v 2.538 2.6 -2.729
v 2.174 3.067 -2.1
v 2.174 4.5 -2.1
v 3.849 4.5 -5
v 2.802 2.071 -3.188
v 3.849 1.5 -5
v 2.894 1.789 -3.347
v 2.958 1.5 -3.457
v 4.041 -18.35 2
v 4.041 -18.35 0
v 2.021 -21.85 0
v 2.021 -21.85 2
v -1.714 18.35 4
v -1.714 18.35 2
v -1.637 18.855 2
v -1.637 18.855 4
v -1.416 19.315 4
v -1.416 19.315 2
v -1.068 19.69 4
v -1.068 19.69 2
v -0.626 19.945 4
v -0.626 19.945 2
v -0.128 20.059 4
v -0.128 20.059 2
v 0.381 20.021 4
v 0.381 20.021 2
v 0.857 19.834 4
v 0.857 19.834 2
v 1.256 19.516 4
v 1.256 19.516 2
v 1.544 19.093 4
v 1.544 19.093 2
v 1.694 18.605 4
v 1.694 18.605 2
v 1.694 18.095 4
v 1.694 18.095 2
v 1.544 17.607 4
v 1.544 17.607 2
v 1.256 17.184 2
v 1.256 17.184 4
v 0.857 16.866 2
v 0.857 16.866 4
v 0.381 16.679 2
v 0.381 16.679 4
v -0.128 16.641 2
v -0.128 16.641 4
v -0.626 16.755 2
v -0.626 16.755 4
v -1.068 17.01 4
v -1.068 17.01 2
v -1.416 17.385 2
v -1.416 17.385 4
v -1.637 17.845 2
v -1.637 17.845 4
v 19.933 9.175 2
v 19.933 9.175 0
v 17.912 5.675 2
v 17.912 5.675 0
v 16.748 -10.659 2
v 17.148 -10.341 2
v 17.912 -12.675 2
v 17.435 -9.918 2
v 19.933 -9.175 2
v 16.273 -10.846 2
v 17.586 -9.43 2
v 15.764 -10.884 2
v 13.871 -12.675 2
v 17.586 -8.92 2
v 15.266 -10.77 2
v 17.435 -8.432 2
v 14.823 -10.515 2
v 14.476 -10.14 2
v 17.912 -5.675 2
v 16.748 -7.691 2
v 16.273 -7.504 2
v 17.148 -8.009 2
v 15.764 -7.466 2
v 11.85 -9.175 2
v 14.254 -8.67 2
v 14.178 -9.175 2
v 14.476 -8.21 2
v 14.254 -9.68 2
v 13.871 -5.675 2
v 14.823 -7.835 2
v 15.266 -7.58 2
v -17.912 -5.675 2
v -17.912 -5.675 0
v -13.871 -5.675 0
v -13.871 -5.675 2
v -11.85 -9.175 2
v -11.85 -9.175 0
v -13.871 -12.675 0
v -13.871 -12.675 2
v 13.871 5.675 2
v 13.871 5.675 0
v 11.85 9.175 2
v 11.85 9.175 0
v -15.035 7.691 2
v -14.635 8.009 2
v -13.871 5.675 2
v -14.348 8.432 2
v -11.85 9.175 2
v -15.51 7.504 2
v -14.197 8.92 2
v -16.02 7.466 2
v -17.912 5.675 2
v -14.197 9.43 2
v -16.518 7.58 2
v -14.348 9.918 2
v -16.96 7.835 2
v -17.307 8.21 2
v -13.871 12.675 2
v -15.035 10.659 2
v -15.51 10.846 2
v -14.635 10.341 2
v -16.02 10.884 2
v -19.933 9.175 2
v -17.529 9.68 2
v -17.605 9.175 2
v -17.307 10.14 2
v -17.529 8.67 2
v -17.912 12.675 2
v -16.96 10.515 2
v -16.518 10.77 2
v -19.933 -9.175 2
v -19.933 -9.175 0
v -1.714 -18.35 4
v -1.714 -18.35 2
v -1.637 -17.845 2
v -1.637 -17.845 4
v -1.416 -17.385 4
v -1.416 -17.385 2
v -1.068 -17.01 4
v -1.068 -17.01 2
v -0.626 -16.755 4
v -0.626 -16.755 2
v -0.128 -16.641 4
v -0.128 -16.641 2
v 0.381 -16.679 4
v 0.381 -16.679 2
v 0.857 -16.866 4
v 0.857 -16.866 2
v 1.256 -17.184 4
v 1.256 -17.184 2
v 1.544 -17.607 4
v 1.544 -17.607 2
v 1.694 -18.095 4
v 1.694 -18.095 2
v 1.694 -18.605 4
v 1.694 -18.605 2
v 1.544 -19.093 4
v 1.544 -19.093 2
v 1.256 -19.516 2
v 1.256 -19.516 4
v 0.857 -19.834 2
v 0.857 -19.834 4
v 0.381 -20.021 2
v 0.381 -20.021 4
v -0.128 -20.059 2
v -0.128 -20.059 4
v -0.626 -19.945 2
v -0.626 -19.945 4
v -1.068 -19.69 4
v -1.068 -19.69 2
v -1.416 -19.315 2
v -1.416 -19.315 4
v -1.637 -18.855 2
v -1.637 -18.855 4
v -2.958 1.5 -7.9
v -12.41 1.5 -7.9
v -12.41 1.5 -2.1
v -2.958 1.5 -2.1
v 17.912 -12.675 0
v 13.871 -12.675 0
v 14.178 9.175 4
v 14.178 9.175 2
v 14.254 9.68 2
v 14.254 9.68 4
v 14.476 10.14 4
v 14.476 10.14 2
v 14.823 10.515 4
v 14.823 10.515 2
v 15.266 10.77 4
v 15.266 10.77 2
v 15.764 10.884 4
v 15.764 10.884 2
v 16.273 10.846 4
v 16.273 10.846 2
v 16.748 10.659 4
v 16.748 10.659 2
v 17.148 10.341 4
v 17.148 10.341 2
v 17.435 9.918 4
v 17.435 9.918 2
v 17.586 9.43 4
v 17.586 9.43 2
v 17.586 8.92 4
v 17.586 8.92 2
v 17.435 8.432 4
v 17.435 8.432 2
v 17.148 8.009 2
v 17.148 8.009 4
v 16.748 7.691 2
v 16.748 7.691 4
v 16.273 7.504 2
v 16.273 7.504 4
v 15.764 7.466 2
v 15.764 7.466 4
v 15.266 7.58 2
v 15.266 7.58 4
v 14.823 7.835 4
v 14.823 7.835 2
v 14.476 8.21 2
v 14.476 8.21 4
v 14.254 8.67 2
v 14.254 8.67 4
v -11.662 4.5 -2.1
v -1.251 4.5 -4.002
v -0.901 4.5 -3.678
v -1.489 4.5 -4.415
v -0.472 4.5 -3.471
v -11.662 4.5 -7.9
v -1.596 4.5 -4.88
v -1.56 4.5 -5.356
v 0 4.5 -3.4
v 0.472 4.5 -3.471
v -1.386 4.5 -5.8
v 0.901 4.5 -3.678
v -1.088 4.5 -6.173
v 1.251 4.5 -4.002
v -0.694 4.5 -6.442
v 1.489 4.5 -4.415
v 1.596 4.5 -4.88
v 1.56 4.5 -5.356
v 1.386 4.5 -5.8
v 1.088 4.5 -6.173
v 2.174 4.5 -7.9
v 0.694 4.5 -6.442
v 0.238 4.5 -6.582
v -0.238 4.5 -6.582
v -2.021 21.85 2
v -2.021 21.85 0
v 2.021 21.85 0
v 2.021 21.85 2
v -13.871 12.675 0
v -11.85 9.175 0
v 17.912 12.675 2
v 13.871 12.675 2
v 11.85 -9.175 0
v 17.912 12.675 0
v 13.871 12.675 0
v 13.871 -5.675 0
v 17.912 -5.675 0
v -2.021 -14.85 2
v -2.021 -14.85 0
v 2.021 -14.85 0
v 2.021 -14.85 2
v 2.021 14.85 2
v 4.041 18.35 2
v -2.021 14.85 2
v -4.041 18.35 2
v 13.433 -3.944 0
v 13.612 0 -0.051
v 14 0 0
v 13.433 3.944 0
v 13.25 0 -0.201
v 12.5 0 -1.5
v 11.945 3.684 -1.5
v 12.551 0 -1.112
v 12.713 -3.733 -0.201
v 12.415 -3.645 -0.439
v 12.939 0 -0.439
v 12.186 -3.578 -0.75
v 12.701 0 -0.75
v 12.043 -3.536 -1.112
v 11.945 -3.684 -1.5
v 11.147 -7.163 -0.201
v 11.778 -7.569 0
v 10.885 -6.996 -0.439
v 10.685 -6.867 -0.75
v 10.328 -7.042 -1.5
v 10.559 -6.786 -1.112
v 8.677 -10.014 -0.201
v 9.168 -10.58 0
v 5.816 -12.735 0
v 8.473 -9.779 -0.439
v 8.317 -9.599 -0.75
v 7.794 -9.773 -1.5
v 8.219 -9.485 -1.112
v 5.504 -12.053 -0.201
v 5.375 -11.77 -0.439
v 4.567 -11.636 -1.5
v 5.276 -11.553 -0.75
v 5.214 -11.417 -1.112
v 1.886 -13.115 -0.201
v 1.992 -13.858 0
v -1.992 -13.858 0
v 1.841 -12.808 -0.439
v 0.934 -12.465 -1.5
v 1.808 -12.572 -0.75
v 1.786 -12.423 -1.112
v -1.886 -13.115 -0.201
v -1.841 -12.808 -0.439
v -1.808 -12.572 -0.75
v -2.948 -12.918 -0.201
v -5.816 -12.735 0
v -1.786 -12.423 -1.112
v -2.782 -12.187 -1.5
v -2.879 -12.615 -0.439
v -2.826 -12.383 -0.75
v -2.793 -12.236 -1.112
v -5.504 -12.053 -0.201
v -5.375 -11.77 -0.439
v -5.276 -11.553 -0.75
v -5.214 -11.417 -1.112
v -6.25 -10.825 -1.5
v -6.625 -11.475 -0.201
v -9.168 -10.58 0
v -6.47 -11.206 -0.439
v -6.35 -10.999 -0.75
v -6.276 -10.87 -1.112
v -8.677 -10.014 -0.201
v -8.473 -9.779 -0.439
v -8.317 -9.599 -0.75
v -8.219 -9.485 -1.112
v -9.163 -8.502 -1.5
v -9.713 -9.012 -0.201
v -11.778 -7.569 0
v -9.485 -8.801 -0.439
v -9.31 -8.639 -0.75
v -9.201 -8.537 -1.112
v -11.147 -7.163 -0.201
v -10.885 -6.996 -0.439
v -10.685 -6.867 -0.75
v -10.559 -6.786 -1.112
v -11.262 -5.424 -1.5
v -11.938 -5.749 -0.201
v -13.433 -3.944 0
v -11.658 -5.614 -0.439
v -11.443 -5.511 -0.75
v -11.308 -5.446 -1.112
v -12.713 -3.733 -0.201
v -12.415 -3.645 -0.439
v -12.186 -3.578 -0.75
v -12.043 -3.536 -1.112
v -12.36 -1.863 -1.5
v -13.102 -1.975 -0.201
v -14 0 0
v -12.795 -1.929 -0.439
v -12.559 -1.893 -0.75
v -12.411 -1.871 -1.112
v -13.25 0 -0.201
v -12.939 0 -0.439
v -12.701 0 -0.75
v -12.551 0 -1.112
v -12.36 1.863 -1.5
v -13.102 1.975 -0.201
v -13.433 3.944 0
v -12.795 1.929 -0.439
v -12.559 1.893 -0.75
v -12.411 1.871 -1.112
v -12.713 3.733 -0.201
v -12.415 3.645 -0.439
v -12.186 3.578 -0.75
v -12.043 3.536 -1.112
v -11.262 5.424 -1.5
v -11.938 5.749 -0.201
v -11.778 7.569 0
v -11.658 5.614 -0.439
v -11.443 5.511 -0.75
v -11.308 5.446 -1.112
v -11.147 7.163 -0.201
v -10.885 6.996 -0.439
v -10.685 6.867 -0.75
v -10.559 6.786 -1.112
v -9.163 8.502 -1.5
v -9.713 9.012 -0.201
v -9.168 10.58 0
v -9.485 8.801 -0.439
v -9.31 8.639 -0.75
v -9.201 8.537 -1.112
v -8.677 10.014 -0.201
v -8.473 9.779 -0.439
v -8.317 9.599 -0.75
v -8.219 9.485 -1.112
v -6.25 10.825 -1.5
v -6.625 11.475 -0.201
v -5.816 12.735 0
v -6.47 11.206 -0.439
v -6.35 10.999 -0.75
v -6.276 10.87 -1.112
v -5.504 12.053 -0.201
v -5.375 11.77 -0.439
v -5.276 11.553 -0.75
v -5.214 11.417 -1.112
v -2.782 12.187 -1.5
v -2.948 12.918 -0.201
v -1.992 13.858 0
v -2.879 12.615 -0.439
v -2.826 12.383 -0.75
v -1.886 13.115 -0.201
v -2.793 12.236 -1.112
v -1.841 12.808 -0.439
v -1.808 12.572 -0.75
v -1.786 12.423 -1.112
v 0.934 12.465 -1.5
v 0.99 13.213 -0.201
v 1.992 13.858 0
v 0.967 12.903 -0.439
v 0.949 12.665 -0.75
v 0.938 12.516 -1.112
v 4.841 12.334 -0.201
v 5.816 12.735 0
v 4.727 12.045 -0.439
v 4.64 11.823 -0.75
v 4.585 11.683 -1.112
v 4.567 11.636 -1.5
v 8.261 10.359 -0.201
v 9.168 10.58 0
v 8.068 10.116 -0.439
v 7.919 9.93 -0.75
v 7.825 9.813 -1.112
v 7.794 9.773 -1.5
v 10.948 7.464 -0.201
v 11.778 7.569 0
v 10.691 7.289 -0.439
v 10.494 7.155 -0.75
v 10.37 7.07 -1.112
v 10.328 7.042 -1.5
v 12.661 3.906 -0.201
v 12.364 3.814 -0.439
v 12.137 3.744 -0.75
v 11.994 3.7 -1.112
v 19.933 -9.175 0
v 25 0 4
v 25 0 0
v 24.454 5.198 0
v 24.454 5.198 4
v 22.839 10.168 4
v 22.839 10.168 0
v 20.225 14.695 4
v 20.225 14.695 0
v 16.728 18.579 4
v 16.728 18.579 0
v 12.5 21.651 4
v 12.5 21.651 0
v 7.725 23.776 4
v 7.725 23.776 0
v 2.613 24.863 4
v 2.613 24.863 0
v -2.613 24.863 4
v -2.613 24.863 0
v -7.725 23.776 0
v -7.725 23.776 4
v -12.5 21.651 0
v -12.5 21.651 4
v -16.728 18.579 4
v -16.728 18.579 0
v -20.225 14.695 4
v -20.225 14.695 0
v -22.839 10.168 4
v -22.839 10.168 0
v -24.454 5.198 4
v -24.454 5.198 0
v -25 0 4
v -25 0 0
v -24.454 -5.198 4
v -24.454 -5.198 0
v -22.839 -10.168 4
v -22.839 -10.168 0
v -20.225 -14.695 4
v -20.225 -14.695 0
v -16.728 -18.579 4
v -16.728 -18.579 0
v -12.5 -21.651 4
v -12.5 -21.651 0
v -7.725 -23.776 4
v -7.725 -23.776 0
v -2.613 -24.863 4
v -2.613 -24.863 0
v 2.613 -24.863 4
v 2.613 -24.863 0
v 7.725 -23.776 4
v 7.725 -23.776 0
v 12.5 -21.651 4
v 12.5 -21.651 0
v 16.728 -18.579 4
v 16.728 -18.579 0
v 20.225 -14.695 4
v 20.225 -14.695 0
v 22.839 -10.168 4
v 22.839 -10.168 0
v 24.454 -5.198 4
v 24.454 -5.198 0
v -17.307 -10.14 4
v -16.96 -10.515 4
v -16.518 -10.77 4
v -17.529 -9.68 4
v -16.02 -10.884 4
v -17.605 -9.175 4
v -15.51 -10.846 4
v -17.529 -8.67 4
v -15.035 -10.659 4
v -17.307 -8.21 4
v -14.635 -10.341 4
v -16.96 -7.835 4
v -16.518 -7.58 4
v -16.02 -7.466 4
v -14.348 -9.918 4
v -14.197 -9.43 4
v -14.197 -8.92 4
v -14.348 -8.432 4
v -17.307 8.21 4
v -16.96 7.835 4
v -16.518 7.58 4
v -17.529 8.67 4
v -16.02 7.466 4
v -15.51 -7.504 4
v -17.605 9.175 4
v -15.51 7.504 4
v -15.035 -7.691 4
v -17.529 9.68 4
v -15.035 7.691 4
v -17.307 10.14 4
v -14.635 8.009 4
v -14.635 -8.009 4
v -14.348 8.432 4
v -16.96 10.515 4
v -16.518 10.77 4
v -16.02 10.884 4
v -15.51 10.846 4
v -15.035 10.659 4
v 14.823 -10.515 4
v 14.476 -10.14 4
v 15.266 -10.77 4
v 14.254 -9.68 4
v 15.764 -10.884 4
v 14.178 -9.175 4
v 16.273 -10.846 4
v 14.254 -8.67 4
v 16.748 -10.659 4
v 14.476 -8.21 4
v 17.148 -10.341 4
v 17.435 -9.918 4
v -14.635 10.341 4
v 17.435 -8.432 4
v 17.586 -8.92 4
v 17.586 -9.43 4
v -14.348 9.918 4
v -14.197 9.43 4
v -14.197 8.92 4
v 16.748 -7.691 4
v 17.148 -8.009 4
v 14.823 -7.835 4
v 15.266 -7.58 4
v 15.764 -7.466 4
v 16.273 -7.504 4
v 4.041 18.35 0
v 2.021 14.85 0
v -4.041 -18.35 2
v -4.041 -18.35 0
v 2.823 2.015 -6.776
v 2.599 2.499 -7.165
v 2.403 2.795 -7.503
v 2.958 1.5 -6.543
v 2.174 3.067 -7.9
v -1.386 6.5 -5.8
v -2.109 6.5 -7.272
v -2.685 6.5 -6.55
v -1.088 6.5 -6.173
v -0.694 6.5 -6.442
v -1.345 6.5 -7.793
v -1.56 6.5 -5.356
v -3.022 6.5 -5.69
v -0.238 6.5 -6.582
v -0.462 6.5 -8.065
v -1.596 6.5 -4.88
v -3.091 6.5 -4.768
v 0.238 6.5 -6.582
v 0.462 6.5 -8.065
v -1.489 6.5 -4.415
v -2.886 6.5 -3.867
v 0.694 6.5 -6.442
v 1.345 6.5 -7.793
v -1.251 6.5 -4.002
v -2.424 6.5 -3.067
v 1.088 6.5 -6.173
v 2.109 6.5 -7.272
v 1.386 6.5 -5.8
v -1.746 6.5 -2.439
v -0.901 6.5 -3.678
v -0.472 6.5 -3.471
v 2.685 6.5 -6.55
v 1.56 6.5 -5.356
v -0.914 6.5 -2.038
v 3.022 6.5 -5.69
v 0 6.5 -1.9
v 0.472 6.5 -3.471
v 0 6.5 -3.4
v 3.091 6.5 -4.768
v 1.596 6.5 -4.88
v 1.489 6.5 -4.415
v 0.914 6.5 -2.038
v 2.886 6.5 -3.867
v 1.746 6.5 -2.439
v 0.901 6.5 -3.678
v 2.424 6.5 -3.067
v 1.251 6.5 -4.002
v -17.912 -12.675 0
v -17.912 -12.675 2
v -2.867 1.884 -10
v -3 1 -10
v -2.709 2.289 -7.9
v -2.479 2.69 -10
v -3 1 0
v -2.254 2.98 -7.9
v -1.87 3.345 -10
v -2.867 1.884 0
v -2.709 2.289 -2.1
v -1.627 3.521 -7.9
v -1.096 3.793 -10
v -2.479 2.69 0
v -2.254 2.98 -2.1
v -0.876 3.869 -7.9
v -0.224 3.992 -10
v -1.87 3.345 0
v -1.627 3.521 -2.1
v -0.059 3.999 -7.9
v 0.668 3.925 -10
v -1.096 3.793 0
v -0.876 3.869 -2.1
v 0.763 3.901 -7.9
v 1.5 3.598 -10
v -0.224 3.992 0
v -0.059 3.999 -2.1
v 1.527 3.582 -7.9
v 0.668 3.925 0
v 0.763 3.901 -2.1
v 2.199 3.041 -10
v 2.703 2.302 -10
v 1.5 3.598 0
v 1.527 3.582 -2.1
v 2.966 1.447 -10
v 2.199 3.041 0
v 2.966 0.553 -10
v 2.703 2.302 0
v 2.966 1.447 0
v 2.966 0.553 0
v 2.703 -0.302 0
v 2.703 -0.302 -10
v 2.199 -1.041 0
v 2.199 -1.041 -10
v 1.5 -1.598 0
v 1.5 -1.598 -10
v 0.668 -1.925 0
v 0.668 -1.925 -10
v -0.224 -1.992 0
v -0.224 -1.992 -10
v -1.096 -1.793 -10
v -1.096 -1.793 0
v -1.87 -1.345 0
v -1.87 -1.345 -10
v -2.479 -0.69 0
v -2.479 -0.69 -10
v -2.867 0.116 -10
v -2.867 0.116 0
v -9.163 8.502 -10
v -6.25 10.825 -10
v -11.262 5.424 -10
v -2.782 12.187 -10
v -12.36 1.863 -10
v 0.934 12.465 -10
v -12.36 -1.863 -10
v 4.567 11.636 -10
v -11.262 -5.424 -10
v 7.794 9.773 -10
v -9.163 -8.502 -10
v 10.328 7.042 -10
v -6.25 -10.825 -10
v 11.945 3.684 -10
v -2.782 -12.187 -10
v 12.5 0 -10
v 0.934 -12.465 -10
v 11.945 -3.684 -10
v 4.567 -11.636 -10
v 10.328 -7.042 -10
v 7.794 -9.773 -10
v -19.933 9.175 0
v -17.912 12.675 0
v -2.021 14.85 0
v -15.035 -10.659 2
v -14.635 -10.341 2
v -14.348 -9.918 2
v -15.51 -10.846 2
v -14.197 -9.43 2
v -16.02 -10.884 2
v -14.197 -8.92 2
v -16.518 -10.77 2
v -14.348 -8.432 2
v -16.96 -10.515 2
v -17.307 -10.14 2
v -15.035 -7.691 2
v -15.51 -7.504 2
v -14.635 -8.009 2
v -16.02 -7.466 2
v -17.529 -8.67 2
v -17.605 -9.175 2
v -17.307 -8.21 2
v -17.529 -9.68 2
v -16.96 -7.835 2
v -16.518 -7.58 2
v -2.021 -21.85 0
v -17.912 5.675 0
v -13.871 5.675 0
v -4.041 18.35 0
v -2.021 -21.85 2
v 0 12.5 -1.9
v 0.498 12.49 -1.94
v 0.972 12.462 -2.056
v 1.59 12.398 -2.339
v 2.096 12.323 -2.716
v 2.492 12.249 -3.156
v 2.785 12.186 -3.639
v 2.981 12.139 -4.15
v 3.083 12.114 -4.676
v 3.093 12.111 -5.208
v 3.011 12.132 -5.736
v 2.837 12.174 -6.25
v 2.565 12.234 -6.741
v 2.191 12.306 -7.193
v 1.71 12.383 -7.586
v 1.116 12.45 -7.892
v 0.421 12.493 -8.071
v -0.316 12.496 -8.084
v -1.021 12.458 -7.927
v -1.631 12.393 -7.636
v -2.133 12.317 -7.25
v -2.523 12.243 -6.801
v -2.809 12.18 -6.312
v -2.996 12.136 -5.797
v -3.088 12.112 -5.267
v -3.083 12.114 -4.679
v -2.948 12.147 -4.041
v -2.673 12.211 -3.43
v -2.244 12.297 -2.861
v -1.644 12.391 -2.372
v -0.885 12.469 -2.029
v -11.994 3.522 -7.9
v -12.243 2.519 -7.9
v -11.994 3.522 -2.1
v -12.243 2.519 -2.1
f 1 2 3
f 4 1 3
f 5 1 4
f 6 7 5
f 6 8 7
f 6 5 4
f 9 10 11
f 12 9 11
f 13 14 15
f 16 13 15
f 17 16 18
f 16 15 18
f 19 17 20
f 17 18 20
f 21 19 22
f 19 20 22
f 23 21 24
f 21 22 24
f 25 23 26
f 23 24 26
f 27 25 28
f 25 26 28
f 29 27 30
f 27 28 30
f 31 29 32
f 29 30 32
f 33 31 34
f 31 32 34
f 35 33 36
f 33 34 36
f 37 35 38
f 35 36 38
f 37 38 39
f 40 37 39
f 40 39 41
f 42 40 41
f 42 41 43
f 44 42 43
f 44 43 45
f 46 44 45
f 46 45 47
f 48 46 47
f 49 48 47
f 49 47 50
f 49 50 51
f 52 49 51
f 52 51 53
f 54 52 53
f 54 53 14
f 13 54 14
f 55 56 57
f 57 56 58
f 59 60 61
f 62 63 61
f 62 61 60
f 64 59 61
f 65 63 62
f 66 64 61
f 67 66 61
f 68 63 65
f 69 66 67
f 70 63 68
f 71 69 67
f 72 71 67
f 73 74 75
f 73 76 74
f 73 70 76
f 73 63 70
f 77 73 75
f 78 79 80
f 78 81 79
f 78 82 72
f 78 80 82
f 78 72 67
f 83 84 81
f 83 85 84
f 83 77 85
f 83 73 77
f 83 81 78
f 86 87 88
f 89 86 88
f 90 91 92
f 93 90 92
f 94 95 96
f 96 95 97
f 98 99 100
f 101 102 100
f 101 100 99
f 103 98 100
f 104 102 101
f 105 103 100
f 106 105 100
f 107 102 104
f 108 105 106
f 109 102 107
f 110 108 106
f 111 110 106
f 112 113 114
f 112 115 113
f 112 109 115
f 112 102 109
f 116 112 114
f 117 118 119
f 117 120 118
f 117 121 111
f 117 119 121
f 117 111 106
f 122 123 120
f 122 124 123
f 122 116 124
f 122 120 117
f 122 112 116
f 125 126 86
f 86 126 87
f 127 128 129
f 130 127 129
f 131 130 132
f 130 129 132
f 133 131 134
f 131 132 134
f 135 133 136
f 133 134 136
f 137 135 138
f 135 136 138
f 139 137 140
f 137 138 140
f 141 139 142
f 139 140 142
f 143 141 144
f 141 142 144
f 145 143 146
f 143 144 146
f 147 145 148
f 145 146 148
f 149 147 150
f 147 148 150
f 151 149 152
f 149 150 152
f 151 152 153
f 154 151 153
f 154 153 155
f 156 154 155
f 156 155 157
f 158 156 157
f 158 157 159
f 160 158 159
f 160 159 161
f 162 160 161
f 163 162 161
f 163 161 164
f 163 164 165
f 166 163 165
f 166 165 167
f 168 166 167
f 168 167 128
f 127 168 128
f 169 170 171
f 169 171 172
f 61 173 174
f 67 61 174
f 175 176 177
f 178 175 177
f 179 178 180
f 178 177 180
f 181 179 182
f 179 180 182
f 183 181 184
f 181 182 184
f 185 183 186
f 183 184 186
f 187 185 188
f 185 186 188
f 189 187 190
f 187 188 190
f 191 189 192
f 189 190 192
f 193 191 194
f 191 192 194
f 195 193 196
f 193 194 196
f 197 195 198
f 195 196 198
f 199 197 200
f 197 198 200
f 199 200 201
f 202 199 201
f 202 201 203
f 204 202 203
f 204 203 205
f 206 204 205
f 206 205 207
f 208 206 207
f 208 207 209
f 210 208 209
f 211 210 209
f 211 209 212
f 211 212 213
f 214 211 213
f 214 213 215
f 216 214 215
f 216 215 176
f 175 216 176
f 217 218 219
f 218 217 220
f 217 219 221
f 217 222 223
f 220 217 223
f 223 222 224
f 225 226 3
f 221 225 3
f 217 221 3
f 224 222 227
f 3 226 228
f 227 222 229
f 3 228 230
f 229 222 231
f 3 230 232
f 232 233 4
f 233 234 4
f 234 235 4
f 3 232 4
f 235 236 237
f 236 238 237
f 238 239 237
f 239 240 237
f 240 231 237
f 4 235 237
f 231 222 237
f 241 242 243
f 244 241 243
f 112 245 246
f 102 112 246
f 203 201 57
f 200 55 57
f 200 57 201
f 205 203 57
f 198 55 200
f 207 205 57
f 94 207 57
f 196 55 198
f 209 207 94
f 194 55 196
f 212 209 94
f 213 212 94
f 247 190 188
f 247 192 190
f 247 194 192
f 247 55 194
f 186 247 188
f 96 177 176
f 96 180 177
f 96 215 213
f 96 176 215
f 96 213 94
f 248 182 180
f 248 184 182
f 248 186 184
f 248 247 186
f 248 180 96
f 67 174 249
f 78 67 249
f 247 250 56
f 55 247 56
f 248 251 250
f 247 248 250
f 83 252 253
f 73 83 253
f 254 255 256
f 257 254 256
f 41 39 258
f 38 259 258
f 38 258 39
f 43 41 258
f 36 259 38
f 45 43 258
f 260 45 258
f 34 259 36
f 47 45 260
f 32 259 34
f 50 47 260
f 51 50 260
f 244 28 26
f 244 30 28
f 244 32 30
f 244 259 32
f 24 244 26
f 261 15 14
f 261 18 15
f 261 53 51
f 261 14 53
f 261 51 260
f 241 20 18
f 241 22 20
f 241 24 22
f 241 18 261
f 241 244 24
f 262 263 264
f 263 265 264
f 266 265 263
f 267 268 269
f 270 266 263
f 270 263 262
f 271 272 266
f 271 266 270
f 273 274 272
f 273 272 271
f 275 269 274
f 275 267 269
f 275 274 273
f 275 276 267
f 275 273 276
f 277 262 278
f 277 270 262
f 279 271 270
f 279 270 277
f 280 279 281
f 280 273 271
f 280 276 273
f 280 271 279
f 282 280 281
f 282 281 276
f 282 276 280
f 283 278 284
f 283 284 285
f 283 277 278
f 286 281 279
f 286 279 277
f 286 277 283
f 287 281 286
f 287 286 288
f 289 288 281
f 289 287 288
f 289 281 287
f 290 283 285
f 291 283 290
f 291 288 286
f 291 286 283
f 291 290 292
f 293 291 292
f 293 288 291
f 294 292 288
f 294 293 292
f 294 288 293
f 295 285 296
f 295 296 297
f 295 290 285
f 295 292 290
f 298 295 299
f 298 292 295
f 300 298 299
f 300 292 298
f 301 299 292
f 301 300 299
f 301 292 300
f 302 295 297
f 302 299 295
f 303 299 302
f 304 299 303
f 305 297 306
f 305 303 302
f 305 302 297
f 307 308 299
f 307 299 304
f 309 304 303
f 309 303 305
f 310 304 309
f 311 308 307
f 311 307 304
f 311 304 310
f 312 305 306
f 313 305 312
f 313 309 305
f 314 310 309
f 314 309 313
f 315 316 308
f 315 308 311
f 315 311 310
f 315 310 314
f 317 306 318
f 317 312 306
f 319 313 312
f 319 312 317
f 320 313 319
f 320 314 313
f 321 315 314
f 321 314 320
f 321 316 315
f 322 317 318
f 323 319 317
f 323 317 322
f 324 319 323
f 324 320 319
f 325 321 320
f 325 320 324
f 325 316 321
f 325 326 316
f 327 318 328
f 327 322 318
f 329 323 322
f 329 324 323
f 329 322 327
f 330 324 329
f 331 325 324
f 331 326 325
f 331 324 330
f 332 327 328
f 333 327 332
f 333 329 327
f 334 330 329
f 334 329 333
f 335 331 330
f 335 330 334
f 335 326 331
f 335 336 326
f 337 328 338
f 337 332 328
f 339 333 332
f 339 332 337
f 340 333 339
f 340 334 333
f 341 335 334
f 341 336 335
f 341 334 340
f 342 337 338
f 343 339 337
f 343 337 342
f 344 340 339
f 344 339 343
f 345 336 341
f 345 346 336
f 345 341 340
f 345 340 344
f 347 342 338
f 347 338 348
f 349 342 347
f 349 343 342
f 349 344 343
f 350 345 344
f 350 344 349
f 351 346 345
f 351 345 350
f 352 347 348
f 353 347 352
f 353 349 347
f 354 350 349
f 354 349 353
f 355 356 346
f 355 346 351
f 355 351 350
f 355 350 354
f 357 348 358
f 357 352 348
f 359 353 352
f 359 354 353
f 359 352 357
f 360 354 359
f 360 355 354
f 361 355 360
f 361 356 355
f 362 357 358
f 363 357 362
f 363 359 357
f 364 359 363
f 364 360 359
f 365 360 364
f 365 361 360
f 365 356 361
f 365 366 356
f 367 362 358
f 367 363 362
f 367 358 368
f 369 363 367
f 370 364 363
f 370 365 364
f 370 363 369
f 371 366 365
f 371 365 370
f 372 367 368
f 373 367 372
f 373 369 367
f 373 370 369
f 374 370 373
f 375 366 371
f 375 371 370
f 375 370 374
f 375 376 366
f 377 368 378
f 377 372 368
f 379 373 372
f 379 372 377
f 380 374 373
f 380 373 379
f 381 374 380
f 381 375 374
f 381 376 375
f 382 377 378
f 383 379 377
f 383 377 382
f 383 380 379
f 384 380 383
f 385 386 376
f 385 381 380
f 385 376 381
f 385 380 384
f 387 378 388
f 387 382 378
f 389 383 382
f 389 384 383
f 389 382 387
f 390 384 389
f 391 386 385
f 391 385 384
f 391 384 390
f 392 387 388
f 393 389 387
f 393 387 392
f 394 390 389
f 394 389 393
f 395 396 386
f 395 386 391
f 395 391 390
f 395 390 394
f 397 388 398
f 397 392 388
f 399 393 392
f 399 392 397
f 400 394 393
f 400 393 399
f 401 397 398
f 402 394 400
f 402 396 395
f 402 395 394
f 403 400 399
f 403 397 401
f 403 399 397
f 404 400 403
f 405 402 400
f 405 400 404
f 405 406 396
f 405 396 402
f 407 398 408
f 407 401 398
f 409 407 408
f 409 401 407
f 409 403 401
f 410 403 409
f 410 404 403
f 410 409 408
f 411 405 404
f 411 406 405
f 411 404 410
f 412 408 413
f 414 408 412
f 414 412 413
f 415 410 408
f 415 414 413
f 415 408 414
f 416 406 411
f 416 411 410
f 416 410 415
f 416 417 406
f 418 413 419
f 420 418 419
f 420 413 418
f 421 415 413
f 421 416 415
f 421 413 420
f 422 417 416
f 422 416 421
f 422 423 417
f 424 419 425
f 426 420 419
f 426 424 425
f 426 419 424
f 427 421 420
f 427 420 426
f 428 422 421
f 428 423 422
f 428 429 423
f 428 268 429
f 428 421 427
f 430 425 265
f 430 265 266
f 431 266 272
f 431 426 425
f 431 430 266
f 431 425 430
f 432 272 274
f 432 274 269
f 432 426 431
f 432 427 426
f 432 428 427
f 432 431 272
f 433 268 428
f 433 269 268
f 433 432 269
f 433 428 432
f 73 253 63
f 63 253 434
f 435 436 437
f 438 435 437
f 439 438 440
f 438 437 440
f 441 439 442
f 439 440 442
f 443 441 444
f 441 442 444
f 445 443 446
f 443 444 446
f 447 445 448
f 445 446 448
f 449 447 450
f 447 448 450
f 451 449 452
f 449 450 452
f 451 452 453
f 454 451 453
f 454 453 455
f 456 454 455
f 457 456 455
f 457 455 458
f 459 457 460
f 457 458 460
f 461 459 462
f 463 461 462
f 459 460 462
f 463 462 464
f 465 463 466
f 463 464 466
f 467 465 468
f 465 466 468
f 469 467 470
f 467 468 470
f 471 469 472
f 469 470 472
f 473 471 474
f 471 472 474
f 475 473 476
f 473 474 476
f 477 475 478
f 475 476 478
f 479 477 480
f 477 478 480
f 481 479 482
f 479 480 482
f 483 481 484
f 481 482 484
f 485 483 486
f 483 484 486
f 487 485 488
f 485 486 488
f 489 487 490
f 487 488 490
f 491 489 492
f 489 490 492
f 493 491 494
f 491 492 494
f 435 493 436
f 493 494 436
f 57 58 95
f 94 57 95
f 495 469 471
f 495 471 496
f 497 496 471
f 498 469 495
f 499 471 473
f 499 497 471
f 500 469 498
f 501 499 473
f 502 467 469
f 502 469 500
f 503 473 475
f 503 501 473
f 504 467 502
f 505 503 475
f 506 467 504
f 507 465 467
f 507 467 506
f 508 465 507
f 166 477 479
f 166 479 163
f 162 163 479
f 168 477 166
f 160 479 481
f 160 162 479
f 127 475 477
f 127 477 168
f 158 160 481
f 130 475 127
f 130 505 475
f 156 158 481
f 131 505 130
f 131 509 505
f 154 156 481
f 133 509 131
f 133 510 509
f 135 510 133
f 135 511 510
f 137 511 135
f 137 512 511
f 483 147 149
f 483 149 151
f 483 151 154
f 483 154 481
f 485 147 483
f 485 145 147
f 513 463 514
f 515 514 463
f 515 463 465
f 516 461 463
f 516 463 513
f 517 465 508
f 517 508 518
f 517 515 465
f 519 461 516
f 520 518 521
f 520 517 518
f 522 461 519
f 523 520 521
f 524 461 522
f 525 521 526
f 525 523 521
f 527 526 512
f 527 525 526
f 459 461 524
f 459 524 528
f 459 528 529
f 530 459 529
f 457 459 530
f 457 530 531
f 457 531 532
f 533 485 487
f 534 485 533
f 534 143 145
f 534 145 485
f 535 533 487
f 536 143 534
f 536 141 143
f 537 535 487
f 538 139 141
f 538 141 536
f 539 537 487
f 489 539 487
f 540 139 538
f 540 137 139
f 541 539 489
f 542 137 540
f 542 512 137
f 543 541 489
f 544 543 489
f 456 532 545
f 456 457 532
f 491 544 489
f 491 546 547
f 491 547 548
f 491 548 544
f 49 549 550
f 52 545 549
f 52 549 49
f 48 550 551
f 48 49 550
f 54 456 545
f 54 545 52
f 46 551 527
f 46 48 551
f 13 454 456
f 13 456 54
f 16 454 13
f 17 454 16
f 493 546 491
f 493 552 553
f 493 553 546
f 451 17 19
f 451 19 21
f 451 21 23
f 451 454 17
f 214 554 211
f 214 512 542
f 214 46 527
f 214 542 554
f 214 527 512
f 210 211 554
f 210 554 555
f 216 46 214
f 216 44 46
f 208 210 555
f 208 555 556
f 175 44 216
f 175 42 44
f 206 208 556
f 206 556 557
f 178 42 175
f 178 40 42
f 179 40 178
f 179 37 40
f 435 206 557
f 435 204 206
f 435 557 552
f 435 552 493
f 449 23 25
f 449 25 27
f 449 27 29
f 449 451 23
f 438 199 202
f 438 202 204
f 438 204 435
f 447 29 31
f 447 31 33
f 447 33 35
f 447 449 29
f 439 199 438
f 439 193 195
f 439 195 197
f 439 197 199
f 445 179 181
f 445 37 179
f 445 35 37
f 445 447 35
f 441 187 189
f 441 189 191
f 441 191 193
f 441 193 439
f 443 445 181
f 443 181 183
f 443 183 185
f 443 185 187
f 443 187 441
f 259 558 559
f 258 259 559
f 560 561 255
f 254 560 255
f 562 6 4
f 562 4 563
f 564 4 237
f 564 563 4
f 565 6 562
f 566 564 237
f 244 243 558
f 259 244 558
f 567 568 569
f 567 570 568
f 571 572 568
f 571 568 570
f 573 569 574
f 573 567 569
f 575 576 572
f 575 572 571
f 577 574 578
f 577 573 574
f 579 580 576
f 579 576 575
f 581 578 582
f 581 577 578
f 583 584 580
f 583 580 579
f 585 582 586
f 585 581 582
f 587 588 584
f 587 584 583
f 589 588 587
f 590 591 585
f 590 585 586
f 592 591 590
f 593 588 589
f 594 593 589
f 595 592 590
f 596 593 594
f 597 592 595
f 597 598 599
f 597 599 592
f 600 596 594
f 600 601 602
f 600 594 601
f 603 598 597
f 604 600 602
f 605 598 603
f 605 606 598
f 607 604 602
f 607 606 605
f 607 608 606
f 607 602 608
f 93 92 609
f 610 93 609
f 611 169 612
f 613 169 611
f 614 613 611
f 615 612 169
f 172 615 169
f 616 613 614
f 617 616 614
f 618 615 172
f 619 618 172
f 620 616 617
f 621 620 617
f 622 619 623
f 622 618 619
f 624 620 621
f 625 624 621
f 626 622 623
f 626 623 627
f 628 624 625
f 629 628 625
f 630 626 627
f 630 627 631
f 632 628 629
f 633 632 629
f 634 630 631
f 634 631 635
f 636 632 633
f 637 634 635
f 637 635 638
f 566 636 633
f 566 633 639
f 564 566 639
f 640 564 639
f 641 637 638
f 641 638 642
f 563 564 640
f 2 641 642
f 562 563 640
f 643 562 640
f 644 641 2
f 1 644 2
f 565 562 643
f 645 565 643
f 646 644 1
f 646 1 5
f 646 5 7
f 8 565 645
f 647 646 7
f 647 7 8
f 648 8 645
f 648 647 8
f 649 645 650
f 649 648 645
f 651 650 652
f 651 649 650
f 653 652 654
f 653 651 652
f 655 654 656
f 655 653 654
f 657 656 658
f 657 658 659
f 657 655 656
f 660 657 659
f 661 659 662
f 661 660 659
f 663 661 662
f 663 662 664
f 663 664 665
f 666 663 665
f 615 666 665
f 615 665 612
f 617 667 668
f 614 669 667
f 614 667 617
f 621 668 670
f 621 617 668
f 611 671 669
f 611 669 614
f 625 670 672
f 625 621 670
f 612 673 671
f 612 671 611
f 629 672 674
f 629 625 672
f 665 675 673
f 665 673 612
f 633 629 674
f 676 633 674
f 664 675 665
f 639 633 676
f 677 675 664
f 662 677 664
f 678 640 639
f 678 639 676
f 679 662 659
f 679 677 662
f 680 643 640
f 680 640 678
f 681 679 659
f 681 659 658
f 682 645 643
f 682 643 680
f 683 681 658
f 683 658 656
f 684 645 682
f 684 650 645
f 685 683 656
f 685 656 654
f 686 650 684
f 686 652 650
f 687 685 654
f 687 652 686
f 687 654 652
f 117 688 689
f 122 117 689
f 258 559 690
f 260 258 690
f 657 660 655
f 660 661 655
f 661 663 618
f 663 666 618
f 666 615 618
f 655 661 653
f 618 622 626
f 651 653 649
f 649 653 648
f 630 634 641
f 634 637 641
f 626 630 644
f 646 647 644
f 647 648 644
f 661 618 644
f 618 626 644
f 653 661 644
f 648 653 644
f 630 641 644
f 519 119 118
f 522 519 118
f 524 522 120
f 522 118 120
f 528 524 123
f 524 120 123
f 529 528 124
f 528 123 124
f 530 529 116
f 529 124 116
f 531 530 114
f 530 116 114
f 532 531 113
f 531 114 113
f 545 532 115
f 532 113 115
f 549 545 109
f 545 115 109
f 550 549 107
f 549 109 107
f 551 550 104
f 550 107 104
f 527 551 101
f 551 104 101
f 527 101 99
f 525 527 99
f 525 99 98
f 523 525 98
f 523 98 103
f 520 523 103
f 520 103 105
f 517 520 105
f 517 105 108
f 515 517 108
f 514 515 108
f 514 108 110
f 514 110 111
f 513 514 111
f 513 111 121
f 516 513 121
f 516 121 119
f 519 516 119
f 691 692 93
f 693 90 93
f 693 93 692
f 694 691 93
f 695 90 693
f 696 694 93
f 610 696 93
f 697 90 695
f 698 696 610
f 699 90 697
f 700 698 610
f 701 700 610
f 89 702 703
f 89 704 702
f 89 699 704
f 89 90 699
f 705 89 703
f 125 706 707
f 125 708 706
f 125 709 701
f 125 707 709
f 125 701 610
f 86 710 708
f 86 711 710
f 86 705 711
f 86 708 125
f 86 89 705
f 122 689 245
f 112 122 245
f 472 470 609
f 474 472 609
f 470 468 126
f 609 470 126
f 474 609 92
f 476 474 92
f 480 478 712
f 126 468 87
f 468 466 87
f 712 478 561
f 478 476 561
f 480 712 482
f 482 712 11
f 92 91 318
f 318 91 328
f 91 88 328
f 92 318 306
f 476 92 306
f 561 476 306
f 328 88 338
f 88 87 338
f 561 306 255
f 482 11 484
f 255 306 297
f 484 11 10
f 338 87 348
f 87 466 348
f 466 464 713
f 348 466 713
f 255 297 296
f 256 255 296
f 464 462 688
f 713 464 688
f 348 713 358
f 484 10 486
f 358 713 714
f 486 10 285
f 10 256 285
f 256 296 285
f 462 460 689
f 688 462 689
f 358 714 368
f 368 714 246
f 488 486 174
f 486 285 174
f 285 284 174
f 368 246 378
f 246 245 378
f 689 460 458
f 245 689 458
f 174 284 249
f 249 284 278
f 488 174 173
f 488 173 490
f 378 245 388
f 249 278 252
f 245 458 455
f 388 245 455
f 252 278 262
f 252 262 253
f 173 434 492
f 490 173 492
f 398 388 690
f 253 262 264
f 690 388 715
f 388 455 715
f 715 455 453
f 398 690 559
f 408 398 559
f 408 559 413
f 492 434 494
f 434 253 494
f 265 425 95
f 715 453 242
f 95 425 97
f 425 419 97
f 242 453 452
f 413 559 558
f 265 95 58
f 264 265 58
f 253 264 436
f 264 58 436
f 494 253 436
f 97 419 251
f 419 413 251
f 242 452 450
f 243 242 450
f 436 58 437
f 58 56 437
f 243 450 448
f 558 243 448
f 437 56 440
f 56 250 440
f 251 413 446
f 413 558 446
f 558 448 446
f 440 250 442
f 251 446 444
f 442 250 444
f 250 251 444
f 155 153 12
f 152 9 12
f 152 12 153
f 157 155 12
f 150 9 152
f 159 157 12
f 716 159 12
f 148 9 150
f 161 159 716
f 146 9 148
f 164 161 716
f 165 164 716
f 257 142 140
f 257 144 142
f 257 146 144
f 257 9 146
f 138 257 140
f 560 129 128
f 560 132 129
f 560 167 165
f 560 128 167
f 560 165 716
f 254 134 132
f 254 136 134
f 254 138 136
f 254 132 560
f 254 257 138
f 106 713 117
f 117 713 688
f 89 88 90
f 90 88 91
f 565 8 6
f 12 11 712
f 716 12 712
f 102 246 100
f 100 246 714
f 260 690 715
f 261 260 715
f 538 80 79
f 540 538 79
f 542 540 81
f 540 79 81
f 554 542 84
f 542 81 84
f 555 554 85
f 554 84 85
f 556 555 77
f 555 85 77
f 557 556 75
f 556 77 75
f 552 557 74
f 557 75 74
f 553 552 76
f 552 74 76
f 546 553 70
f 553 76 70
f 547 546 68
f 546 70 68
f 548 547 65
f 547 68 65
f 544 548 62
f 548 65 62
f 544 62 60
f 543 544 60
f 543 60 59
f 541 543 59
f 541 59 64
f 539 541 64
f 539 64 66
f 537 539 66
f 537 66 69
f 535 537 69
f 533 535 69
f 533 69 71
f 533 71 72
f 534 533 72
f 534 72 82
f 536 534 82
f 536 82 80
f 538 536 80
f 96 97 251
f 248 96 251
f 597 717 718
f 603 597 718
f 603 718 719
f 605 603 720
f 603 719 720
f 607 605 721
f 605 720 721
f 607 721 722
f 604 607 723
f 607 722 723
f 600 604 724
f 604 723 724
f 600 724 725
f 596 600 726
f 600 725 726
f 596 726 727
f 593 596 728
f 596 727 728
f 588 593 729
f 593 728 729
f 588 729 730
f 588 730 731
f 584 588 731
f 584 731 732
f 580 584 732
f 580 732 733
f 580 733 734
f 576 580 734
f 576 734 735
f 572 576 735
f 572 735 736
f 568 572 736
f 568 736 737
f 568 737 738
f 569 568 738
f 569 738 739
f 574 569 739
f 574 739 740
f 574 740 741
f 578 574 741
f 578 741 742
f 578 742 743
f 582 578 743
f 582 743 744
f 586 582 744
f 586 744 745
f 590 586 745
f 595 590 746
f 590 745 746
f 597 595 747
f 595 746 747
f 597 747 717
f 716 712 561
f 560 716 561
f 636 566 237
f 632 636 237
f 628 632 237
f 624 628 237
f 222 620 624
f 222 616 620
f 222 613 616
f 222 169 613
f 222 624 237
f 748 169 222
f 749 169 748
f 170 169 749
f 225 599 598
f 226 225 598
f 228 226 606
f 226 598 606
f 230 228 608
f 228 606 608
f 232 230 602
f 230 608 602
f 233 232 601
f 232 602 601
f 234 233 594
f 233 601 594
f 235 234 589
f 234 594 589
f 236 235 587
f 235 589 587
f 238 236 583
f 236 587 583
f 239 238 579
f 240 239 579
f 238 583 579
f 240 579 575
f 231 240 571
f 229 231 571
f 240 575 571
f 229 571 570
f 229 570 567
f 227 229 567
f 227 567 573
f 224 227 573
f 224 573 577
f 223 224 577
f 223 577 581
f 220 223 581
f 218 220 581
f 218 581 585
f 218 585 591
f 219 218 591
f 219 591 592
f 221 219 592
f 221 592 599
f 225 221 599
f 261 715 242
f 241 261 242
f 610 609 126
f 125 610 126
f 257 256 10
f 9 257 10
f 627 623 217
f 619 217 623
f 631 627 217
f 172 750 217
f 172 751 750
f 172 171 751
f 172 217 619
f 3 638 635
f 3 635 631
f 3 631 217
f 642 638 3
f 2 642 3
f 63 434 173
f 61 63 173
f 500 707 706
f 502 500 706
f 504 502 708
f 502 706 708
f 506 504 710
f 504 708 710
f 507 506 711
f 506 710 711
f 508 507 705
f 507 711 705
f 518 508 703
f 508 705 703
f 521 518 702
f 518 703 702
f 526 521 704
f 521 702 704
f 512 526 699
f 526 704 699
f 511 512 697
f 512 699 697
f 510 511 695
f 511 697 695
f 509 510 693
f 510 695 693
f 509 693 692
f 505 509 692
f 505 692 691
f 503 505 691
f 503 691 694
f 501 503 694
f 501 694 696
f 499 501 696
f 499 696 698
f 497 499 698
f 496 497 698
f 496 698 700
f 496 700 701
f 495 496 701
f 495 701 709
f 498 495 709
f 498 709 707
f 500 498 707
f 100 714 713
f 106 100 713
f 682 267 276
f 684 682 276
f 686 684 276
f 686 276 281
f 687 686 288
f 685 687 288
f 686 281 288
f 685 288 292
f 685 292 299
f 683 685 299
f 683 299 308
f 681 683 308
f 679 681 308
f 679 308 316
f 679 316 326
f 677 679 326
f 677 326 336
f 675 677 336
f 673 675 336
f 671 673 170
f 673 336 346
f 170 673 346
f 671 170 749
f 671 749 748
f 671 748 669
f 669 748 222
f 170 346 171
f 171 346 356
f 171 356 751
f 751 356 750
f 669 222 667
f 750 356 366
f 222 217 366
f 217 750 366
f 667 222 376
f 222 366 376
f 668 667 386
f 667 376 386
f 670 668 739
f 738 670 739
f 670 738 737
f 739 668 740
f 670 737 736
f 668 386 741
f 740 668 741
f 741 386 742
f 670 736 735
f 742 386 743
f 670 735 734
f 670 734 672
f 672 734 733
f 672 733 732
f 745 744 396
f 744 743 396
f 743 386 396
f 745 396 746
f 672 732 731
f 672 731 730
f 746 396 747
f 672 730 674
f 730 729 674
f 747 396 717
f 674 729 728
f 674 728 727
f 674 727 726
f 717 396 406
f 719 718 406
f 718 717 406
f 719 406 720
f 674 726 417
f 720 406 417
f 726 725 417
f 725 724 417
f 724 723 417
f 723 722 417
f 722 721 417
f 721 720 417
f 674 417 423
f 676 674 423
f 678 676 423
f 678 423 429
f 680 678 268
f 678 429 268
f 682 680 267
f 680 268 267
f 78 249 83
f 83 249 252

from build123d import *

# Parameters (mm, degrees)
SKETCH1_R           = 25
BOSS_EXTRUDE1_DEPTH = 4
SKETCH2_R           = 1.713577746
CUT_EXTRUDE1_DEPTH  = 4
CUT_EXTRUDE2_DEPTH  = 2
SKETCH4_R           = 12.5
SKETCH4_R_2         = 3
BOSS_EXTRUDE2_DEPTH = 10
SKETCH5_R           = 1.6
CUT_EXTRUDE3_DEPTH  = 12.5
SKETCH6_R           = 3.1
CUT_EXTRUDE4_DEPTH  = 6
CUT_EXTRUDE5_DEPTH  = 3
FILLET1_R           = 1.5


with BuildPart() as part:
    # Sketch1 → Boss-Extrude1 (new body)
    with BuildSketch(Plane.XY):
        Circle(SKETCH1_R)
    extrude(amount=BOSS_EXTRUDE1_DEPTH)

    # Sketch2 → Cut-Extrude1 (cut)
    with BuildSketch(Plane(origin=(0, 0, 0), x_dir=(-1, 0, 0), z_dir=(0, 0, -1))):
        with Locations((0, 18.35)):
            Circle(SKETCH2_R)
        with Locations((15.891566159, 9.175)):
            Circle(SKETCH2_R)
        with Locations((15.891566159, -9.175)):
            Circle(SKETCH2_R)
        with Locations((0, -18.35)):
            Circle(SKETCH2_R)
        with Locations((-15.891566159, -9.175)):
            Circle(SKETCH2_R)
        with Locations((-15.891566159, 9.175)):
            Circle(SKETCH2_R)
    extrude(amount=-CUT_EXTRUDE1_DEPTH, mode=Mode.SUBTRACT)

    # Sketch3 → Cut-Extrude2 (cut)
    with BuildSketch(Plane(origin=(0, 0, 0), x_dir=(-1, 0, 0), z_dir=(0, 0, -1))):
        Polygon((13.870840217, 5.675), (17.912292102, 5.675), (19.933018044, 9.175), (17.912292102, 12.675), (13.870840217, 12.675), (11.850114275, 9.175), align=None)
        Polygon((4.041451884, 18.35), (2.020725942, 21.85), (-2.020725942, 21.85), (-4.041451884, 18.35), (-2.020725942, 14.85), (2.020725942, 14.85), align=None)
        Polygon((11.850114275, -9.175), (13.870840217, -12.675), (17.912292102, -12.675), (19.933018044, -9.175), (17.912292102, -5.675), (13.870840217, -5.675), align=None)
        Polygon((-2.020725942, -14.85), (-4.041451884, -18.35), (-2.020725942, -21.85), (2.020725942, -21.85), (4.041451884, -18.35), (2.020725942, -14.85), align=None)
        Polygon((-13.870840217, -5.675), (-17.912292102, -5.675), (-19.933018044, -9.175), (-17.912292102, -12.675), (-13.870840217, -12.675), (-11.850114275, -9.175), align=None)
        Polygon((-11.850114275, 9.175), (-13.870840217, 12.675), (-17.912292102, 12.675), (-19.933018044, 9.175), (-17.912292102, 5.675), (-13.870840217, 5.675), align=None)
    extrude(amount=-CUT_EXTRUDE2_DEPTH, mode=Mode.SUBTRACT)

    # Sketch4 → Boss-Extrude2 (add)
    with BuildSketch(Plane(origin=(0, 0, 0), x_dir=(-1, 0, 0), z_dir=(0, 0, -1))):
        with Locations(Location((0, 0, 0), (0, 0, 180))):
            Circle(SKETCH4_R)
        with Locations((0, 1)):
            Circle(SKETCH4_R_2, mode=Mode.SUBTRACT)
    extrude(amount=BOSS_EXTRUDE2_DEPTH)

    # Sketch5 → Cut-Extrude3 (cut)
    with BuildSketch(Plane(origin=(0, 12.5, 0), x_dir=(1, 0, 0), z_dir=(0, 1, 0))):
        with Locations(Location((0, 5, 0), (0, 0, 270))):
            Circle(SKETCH5_R)
    extrude(amount=-CUT_EXTRUDE3_DEPTH, mode=Mode.SUBTRACT)

    # Sketch6 → Cut-Extrude4 (cut)
    with BuildSketch(Plane(origin=(0, 12.5, 0), x_dir=(1, 0, 0), z_dir=(0, 1, 0))):
        with Locations(Location((0, 5, 0), (0, 0, 270))):
            Circle(SKETCH6_R)
    extrude(amount=-CUT_EXTRUDE4_DEPTH, mode=Mode.SUBTRACT)

    # Sketch7 → Cut-Extrude5 (cut)
    with BuildSketch(Plane(origin=(0, 1.5, 0), x_dir=(1, 0, 0), z_dir=(0, 1, 0))):
        Polygon((2.174315781, 7.9), (-12.5, 7.9), (-12.5, 2.1), (2.174315781, 2.1), (3.848631561, 5), align=None)
    extrude(amount=CUT_EXTRUDE5_DEPTH, mode=Mode.SUBTRACT)

    # Fillet1
    fillet1_edges = [part.edges().sort_by_distance(p)[0] for p in [
        (-12.5, 0, 0),
    ]]
    fillet(fillet1_edges, radius=FILLET1_R)


solid = part.part
